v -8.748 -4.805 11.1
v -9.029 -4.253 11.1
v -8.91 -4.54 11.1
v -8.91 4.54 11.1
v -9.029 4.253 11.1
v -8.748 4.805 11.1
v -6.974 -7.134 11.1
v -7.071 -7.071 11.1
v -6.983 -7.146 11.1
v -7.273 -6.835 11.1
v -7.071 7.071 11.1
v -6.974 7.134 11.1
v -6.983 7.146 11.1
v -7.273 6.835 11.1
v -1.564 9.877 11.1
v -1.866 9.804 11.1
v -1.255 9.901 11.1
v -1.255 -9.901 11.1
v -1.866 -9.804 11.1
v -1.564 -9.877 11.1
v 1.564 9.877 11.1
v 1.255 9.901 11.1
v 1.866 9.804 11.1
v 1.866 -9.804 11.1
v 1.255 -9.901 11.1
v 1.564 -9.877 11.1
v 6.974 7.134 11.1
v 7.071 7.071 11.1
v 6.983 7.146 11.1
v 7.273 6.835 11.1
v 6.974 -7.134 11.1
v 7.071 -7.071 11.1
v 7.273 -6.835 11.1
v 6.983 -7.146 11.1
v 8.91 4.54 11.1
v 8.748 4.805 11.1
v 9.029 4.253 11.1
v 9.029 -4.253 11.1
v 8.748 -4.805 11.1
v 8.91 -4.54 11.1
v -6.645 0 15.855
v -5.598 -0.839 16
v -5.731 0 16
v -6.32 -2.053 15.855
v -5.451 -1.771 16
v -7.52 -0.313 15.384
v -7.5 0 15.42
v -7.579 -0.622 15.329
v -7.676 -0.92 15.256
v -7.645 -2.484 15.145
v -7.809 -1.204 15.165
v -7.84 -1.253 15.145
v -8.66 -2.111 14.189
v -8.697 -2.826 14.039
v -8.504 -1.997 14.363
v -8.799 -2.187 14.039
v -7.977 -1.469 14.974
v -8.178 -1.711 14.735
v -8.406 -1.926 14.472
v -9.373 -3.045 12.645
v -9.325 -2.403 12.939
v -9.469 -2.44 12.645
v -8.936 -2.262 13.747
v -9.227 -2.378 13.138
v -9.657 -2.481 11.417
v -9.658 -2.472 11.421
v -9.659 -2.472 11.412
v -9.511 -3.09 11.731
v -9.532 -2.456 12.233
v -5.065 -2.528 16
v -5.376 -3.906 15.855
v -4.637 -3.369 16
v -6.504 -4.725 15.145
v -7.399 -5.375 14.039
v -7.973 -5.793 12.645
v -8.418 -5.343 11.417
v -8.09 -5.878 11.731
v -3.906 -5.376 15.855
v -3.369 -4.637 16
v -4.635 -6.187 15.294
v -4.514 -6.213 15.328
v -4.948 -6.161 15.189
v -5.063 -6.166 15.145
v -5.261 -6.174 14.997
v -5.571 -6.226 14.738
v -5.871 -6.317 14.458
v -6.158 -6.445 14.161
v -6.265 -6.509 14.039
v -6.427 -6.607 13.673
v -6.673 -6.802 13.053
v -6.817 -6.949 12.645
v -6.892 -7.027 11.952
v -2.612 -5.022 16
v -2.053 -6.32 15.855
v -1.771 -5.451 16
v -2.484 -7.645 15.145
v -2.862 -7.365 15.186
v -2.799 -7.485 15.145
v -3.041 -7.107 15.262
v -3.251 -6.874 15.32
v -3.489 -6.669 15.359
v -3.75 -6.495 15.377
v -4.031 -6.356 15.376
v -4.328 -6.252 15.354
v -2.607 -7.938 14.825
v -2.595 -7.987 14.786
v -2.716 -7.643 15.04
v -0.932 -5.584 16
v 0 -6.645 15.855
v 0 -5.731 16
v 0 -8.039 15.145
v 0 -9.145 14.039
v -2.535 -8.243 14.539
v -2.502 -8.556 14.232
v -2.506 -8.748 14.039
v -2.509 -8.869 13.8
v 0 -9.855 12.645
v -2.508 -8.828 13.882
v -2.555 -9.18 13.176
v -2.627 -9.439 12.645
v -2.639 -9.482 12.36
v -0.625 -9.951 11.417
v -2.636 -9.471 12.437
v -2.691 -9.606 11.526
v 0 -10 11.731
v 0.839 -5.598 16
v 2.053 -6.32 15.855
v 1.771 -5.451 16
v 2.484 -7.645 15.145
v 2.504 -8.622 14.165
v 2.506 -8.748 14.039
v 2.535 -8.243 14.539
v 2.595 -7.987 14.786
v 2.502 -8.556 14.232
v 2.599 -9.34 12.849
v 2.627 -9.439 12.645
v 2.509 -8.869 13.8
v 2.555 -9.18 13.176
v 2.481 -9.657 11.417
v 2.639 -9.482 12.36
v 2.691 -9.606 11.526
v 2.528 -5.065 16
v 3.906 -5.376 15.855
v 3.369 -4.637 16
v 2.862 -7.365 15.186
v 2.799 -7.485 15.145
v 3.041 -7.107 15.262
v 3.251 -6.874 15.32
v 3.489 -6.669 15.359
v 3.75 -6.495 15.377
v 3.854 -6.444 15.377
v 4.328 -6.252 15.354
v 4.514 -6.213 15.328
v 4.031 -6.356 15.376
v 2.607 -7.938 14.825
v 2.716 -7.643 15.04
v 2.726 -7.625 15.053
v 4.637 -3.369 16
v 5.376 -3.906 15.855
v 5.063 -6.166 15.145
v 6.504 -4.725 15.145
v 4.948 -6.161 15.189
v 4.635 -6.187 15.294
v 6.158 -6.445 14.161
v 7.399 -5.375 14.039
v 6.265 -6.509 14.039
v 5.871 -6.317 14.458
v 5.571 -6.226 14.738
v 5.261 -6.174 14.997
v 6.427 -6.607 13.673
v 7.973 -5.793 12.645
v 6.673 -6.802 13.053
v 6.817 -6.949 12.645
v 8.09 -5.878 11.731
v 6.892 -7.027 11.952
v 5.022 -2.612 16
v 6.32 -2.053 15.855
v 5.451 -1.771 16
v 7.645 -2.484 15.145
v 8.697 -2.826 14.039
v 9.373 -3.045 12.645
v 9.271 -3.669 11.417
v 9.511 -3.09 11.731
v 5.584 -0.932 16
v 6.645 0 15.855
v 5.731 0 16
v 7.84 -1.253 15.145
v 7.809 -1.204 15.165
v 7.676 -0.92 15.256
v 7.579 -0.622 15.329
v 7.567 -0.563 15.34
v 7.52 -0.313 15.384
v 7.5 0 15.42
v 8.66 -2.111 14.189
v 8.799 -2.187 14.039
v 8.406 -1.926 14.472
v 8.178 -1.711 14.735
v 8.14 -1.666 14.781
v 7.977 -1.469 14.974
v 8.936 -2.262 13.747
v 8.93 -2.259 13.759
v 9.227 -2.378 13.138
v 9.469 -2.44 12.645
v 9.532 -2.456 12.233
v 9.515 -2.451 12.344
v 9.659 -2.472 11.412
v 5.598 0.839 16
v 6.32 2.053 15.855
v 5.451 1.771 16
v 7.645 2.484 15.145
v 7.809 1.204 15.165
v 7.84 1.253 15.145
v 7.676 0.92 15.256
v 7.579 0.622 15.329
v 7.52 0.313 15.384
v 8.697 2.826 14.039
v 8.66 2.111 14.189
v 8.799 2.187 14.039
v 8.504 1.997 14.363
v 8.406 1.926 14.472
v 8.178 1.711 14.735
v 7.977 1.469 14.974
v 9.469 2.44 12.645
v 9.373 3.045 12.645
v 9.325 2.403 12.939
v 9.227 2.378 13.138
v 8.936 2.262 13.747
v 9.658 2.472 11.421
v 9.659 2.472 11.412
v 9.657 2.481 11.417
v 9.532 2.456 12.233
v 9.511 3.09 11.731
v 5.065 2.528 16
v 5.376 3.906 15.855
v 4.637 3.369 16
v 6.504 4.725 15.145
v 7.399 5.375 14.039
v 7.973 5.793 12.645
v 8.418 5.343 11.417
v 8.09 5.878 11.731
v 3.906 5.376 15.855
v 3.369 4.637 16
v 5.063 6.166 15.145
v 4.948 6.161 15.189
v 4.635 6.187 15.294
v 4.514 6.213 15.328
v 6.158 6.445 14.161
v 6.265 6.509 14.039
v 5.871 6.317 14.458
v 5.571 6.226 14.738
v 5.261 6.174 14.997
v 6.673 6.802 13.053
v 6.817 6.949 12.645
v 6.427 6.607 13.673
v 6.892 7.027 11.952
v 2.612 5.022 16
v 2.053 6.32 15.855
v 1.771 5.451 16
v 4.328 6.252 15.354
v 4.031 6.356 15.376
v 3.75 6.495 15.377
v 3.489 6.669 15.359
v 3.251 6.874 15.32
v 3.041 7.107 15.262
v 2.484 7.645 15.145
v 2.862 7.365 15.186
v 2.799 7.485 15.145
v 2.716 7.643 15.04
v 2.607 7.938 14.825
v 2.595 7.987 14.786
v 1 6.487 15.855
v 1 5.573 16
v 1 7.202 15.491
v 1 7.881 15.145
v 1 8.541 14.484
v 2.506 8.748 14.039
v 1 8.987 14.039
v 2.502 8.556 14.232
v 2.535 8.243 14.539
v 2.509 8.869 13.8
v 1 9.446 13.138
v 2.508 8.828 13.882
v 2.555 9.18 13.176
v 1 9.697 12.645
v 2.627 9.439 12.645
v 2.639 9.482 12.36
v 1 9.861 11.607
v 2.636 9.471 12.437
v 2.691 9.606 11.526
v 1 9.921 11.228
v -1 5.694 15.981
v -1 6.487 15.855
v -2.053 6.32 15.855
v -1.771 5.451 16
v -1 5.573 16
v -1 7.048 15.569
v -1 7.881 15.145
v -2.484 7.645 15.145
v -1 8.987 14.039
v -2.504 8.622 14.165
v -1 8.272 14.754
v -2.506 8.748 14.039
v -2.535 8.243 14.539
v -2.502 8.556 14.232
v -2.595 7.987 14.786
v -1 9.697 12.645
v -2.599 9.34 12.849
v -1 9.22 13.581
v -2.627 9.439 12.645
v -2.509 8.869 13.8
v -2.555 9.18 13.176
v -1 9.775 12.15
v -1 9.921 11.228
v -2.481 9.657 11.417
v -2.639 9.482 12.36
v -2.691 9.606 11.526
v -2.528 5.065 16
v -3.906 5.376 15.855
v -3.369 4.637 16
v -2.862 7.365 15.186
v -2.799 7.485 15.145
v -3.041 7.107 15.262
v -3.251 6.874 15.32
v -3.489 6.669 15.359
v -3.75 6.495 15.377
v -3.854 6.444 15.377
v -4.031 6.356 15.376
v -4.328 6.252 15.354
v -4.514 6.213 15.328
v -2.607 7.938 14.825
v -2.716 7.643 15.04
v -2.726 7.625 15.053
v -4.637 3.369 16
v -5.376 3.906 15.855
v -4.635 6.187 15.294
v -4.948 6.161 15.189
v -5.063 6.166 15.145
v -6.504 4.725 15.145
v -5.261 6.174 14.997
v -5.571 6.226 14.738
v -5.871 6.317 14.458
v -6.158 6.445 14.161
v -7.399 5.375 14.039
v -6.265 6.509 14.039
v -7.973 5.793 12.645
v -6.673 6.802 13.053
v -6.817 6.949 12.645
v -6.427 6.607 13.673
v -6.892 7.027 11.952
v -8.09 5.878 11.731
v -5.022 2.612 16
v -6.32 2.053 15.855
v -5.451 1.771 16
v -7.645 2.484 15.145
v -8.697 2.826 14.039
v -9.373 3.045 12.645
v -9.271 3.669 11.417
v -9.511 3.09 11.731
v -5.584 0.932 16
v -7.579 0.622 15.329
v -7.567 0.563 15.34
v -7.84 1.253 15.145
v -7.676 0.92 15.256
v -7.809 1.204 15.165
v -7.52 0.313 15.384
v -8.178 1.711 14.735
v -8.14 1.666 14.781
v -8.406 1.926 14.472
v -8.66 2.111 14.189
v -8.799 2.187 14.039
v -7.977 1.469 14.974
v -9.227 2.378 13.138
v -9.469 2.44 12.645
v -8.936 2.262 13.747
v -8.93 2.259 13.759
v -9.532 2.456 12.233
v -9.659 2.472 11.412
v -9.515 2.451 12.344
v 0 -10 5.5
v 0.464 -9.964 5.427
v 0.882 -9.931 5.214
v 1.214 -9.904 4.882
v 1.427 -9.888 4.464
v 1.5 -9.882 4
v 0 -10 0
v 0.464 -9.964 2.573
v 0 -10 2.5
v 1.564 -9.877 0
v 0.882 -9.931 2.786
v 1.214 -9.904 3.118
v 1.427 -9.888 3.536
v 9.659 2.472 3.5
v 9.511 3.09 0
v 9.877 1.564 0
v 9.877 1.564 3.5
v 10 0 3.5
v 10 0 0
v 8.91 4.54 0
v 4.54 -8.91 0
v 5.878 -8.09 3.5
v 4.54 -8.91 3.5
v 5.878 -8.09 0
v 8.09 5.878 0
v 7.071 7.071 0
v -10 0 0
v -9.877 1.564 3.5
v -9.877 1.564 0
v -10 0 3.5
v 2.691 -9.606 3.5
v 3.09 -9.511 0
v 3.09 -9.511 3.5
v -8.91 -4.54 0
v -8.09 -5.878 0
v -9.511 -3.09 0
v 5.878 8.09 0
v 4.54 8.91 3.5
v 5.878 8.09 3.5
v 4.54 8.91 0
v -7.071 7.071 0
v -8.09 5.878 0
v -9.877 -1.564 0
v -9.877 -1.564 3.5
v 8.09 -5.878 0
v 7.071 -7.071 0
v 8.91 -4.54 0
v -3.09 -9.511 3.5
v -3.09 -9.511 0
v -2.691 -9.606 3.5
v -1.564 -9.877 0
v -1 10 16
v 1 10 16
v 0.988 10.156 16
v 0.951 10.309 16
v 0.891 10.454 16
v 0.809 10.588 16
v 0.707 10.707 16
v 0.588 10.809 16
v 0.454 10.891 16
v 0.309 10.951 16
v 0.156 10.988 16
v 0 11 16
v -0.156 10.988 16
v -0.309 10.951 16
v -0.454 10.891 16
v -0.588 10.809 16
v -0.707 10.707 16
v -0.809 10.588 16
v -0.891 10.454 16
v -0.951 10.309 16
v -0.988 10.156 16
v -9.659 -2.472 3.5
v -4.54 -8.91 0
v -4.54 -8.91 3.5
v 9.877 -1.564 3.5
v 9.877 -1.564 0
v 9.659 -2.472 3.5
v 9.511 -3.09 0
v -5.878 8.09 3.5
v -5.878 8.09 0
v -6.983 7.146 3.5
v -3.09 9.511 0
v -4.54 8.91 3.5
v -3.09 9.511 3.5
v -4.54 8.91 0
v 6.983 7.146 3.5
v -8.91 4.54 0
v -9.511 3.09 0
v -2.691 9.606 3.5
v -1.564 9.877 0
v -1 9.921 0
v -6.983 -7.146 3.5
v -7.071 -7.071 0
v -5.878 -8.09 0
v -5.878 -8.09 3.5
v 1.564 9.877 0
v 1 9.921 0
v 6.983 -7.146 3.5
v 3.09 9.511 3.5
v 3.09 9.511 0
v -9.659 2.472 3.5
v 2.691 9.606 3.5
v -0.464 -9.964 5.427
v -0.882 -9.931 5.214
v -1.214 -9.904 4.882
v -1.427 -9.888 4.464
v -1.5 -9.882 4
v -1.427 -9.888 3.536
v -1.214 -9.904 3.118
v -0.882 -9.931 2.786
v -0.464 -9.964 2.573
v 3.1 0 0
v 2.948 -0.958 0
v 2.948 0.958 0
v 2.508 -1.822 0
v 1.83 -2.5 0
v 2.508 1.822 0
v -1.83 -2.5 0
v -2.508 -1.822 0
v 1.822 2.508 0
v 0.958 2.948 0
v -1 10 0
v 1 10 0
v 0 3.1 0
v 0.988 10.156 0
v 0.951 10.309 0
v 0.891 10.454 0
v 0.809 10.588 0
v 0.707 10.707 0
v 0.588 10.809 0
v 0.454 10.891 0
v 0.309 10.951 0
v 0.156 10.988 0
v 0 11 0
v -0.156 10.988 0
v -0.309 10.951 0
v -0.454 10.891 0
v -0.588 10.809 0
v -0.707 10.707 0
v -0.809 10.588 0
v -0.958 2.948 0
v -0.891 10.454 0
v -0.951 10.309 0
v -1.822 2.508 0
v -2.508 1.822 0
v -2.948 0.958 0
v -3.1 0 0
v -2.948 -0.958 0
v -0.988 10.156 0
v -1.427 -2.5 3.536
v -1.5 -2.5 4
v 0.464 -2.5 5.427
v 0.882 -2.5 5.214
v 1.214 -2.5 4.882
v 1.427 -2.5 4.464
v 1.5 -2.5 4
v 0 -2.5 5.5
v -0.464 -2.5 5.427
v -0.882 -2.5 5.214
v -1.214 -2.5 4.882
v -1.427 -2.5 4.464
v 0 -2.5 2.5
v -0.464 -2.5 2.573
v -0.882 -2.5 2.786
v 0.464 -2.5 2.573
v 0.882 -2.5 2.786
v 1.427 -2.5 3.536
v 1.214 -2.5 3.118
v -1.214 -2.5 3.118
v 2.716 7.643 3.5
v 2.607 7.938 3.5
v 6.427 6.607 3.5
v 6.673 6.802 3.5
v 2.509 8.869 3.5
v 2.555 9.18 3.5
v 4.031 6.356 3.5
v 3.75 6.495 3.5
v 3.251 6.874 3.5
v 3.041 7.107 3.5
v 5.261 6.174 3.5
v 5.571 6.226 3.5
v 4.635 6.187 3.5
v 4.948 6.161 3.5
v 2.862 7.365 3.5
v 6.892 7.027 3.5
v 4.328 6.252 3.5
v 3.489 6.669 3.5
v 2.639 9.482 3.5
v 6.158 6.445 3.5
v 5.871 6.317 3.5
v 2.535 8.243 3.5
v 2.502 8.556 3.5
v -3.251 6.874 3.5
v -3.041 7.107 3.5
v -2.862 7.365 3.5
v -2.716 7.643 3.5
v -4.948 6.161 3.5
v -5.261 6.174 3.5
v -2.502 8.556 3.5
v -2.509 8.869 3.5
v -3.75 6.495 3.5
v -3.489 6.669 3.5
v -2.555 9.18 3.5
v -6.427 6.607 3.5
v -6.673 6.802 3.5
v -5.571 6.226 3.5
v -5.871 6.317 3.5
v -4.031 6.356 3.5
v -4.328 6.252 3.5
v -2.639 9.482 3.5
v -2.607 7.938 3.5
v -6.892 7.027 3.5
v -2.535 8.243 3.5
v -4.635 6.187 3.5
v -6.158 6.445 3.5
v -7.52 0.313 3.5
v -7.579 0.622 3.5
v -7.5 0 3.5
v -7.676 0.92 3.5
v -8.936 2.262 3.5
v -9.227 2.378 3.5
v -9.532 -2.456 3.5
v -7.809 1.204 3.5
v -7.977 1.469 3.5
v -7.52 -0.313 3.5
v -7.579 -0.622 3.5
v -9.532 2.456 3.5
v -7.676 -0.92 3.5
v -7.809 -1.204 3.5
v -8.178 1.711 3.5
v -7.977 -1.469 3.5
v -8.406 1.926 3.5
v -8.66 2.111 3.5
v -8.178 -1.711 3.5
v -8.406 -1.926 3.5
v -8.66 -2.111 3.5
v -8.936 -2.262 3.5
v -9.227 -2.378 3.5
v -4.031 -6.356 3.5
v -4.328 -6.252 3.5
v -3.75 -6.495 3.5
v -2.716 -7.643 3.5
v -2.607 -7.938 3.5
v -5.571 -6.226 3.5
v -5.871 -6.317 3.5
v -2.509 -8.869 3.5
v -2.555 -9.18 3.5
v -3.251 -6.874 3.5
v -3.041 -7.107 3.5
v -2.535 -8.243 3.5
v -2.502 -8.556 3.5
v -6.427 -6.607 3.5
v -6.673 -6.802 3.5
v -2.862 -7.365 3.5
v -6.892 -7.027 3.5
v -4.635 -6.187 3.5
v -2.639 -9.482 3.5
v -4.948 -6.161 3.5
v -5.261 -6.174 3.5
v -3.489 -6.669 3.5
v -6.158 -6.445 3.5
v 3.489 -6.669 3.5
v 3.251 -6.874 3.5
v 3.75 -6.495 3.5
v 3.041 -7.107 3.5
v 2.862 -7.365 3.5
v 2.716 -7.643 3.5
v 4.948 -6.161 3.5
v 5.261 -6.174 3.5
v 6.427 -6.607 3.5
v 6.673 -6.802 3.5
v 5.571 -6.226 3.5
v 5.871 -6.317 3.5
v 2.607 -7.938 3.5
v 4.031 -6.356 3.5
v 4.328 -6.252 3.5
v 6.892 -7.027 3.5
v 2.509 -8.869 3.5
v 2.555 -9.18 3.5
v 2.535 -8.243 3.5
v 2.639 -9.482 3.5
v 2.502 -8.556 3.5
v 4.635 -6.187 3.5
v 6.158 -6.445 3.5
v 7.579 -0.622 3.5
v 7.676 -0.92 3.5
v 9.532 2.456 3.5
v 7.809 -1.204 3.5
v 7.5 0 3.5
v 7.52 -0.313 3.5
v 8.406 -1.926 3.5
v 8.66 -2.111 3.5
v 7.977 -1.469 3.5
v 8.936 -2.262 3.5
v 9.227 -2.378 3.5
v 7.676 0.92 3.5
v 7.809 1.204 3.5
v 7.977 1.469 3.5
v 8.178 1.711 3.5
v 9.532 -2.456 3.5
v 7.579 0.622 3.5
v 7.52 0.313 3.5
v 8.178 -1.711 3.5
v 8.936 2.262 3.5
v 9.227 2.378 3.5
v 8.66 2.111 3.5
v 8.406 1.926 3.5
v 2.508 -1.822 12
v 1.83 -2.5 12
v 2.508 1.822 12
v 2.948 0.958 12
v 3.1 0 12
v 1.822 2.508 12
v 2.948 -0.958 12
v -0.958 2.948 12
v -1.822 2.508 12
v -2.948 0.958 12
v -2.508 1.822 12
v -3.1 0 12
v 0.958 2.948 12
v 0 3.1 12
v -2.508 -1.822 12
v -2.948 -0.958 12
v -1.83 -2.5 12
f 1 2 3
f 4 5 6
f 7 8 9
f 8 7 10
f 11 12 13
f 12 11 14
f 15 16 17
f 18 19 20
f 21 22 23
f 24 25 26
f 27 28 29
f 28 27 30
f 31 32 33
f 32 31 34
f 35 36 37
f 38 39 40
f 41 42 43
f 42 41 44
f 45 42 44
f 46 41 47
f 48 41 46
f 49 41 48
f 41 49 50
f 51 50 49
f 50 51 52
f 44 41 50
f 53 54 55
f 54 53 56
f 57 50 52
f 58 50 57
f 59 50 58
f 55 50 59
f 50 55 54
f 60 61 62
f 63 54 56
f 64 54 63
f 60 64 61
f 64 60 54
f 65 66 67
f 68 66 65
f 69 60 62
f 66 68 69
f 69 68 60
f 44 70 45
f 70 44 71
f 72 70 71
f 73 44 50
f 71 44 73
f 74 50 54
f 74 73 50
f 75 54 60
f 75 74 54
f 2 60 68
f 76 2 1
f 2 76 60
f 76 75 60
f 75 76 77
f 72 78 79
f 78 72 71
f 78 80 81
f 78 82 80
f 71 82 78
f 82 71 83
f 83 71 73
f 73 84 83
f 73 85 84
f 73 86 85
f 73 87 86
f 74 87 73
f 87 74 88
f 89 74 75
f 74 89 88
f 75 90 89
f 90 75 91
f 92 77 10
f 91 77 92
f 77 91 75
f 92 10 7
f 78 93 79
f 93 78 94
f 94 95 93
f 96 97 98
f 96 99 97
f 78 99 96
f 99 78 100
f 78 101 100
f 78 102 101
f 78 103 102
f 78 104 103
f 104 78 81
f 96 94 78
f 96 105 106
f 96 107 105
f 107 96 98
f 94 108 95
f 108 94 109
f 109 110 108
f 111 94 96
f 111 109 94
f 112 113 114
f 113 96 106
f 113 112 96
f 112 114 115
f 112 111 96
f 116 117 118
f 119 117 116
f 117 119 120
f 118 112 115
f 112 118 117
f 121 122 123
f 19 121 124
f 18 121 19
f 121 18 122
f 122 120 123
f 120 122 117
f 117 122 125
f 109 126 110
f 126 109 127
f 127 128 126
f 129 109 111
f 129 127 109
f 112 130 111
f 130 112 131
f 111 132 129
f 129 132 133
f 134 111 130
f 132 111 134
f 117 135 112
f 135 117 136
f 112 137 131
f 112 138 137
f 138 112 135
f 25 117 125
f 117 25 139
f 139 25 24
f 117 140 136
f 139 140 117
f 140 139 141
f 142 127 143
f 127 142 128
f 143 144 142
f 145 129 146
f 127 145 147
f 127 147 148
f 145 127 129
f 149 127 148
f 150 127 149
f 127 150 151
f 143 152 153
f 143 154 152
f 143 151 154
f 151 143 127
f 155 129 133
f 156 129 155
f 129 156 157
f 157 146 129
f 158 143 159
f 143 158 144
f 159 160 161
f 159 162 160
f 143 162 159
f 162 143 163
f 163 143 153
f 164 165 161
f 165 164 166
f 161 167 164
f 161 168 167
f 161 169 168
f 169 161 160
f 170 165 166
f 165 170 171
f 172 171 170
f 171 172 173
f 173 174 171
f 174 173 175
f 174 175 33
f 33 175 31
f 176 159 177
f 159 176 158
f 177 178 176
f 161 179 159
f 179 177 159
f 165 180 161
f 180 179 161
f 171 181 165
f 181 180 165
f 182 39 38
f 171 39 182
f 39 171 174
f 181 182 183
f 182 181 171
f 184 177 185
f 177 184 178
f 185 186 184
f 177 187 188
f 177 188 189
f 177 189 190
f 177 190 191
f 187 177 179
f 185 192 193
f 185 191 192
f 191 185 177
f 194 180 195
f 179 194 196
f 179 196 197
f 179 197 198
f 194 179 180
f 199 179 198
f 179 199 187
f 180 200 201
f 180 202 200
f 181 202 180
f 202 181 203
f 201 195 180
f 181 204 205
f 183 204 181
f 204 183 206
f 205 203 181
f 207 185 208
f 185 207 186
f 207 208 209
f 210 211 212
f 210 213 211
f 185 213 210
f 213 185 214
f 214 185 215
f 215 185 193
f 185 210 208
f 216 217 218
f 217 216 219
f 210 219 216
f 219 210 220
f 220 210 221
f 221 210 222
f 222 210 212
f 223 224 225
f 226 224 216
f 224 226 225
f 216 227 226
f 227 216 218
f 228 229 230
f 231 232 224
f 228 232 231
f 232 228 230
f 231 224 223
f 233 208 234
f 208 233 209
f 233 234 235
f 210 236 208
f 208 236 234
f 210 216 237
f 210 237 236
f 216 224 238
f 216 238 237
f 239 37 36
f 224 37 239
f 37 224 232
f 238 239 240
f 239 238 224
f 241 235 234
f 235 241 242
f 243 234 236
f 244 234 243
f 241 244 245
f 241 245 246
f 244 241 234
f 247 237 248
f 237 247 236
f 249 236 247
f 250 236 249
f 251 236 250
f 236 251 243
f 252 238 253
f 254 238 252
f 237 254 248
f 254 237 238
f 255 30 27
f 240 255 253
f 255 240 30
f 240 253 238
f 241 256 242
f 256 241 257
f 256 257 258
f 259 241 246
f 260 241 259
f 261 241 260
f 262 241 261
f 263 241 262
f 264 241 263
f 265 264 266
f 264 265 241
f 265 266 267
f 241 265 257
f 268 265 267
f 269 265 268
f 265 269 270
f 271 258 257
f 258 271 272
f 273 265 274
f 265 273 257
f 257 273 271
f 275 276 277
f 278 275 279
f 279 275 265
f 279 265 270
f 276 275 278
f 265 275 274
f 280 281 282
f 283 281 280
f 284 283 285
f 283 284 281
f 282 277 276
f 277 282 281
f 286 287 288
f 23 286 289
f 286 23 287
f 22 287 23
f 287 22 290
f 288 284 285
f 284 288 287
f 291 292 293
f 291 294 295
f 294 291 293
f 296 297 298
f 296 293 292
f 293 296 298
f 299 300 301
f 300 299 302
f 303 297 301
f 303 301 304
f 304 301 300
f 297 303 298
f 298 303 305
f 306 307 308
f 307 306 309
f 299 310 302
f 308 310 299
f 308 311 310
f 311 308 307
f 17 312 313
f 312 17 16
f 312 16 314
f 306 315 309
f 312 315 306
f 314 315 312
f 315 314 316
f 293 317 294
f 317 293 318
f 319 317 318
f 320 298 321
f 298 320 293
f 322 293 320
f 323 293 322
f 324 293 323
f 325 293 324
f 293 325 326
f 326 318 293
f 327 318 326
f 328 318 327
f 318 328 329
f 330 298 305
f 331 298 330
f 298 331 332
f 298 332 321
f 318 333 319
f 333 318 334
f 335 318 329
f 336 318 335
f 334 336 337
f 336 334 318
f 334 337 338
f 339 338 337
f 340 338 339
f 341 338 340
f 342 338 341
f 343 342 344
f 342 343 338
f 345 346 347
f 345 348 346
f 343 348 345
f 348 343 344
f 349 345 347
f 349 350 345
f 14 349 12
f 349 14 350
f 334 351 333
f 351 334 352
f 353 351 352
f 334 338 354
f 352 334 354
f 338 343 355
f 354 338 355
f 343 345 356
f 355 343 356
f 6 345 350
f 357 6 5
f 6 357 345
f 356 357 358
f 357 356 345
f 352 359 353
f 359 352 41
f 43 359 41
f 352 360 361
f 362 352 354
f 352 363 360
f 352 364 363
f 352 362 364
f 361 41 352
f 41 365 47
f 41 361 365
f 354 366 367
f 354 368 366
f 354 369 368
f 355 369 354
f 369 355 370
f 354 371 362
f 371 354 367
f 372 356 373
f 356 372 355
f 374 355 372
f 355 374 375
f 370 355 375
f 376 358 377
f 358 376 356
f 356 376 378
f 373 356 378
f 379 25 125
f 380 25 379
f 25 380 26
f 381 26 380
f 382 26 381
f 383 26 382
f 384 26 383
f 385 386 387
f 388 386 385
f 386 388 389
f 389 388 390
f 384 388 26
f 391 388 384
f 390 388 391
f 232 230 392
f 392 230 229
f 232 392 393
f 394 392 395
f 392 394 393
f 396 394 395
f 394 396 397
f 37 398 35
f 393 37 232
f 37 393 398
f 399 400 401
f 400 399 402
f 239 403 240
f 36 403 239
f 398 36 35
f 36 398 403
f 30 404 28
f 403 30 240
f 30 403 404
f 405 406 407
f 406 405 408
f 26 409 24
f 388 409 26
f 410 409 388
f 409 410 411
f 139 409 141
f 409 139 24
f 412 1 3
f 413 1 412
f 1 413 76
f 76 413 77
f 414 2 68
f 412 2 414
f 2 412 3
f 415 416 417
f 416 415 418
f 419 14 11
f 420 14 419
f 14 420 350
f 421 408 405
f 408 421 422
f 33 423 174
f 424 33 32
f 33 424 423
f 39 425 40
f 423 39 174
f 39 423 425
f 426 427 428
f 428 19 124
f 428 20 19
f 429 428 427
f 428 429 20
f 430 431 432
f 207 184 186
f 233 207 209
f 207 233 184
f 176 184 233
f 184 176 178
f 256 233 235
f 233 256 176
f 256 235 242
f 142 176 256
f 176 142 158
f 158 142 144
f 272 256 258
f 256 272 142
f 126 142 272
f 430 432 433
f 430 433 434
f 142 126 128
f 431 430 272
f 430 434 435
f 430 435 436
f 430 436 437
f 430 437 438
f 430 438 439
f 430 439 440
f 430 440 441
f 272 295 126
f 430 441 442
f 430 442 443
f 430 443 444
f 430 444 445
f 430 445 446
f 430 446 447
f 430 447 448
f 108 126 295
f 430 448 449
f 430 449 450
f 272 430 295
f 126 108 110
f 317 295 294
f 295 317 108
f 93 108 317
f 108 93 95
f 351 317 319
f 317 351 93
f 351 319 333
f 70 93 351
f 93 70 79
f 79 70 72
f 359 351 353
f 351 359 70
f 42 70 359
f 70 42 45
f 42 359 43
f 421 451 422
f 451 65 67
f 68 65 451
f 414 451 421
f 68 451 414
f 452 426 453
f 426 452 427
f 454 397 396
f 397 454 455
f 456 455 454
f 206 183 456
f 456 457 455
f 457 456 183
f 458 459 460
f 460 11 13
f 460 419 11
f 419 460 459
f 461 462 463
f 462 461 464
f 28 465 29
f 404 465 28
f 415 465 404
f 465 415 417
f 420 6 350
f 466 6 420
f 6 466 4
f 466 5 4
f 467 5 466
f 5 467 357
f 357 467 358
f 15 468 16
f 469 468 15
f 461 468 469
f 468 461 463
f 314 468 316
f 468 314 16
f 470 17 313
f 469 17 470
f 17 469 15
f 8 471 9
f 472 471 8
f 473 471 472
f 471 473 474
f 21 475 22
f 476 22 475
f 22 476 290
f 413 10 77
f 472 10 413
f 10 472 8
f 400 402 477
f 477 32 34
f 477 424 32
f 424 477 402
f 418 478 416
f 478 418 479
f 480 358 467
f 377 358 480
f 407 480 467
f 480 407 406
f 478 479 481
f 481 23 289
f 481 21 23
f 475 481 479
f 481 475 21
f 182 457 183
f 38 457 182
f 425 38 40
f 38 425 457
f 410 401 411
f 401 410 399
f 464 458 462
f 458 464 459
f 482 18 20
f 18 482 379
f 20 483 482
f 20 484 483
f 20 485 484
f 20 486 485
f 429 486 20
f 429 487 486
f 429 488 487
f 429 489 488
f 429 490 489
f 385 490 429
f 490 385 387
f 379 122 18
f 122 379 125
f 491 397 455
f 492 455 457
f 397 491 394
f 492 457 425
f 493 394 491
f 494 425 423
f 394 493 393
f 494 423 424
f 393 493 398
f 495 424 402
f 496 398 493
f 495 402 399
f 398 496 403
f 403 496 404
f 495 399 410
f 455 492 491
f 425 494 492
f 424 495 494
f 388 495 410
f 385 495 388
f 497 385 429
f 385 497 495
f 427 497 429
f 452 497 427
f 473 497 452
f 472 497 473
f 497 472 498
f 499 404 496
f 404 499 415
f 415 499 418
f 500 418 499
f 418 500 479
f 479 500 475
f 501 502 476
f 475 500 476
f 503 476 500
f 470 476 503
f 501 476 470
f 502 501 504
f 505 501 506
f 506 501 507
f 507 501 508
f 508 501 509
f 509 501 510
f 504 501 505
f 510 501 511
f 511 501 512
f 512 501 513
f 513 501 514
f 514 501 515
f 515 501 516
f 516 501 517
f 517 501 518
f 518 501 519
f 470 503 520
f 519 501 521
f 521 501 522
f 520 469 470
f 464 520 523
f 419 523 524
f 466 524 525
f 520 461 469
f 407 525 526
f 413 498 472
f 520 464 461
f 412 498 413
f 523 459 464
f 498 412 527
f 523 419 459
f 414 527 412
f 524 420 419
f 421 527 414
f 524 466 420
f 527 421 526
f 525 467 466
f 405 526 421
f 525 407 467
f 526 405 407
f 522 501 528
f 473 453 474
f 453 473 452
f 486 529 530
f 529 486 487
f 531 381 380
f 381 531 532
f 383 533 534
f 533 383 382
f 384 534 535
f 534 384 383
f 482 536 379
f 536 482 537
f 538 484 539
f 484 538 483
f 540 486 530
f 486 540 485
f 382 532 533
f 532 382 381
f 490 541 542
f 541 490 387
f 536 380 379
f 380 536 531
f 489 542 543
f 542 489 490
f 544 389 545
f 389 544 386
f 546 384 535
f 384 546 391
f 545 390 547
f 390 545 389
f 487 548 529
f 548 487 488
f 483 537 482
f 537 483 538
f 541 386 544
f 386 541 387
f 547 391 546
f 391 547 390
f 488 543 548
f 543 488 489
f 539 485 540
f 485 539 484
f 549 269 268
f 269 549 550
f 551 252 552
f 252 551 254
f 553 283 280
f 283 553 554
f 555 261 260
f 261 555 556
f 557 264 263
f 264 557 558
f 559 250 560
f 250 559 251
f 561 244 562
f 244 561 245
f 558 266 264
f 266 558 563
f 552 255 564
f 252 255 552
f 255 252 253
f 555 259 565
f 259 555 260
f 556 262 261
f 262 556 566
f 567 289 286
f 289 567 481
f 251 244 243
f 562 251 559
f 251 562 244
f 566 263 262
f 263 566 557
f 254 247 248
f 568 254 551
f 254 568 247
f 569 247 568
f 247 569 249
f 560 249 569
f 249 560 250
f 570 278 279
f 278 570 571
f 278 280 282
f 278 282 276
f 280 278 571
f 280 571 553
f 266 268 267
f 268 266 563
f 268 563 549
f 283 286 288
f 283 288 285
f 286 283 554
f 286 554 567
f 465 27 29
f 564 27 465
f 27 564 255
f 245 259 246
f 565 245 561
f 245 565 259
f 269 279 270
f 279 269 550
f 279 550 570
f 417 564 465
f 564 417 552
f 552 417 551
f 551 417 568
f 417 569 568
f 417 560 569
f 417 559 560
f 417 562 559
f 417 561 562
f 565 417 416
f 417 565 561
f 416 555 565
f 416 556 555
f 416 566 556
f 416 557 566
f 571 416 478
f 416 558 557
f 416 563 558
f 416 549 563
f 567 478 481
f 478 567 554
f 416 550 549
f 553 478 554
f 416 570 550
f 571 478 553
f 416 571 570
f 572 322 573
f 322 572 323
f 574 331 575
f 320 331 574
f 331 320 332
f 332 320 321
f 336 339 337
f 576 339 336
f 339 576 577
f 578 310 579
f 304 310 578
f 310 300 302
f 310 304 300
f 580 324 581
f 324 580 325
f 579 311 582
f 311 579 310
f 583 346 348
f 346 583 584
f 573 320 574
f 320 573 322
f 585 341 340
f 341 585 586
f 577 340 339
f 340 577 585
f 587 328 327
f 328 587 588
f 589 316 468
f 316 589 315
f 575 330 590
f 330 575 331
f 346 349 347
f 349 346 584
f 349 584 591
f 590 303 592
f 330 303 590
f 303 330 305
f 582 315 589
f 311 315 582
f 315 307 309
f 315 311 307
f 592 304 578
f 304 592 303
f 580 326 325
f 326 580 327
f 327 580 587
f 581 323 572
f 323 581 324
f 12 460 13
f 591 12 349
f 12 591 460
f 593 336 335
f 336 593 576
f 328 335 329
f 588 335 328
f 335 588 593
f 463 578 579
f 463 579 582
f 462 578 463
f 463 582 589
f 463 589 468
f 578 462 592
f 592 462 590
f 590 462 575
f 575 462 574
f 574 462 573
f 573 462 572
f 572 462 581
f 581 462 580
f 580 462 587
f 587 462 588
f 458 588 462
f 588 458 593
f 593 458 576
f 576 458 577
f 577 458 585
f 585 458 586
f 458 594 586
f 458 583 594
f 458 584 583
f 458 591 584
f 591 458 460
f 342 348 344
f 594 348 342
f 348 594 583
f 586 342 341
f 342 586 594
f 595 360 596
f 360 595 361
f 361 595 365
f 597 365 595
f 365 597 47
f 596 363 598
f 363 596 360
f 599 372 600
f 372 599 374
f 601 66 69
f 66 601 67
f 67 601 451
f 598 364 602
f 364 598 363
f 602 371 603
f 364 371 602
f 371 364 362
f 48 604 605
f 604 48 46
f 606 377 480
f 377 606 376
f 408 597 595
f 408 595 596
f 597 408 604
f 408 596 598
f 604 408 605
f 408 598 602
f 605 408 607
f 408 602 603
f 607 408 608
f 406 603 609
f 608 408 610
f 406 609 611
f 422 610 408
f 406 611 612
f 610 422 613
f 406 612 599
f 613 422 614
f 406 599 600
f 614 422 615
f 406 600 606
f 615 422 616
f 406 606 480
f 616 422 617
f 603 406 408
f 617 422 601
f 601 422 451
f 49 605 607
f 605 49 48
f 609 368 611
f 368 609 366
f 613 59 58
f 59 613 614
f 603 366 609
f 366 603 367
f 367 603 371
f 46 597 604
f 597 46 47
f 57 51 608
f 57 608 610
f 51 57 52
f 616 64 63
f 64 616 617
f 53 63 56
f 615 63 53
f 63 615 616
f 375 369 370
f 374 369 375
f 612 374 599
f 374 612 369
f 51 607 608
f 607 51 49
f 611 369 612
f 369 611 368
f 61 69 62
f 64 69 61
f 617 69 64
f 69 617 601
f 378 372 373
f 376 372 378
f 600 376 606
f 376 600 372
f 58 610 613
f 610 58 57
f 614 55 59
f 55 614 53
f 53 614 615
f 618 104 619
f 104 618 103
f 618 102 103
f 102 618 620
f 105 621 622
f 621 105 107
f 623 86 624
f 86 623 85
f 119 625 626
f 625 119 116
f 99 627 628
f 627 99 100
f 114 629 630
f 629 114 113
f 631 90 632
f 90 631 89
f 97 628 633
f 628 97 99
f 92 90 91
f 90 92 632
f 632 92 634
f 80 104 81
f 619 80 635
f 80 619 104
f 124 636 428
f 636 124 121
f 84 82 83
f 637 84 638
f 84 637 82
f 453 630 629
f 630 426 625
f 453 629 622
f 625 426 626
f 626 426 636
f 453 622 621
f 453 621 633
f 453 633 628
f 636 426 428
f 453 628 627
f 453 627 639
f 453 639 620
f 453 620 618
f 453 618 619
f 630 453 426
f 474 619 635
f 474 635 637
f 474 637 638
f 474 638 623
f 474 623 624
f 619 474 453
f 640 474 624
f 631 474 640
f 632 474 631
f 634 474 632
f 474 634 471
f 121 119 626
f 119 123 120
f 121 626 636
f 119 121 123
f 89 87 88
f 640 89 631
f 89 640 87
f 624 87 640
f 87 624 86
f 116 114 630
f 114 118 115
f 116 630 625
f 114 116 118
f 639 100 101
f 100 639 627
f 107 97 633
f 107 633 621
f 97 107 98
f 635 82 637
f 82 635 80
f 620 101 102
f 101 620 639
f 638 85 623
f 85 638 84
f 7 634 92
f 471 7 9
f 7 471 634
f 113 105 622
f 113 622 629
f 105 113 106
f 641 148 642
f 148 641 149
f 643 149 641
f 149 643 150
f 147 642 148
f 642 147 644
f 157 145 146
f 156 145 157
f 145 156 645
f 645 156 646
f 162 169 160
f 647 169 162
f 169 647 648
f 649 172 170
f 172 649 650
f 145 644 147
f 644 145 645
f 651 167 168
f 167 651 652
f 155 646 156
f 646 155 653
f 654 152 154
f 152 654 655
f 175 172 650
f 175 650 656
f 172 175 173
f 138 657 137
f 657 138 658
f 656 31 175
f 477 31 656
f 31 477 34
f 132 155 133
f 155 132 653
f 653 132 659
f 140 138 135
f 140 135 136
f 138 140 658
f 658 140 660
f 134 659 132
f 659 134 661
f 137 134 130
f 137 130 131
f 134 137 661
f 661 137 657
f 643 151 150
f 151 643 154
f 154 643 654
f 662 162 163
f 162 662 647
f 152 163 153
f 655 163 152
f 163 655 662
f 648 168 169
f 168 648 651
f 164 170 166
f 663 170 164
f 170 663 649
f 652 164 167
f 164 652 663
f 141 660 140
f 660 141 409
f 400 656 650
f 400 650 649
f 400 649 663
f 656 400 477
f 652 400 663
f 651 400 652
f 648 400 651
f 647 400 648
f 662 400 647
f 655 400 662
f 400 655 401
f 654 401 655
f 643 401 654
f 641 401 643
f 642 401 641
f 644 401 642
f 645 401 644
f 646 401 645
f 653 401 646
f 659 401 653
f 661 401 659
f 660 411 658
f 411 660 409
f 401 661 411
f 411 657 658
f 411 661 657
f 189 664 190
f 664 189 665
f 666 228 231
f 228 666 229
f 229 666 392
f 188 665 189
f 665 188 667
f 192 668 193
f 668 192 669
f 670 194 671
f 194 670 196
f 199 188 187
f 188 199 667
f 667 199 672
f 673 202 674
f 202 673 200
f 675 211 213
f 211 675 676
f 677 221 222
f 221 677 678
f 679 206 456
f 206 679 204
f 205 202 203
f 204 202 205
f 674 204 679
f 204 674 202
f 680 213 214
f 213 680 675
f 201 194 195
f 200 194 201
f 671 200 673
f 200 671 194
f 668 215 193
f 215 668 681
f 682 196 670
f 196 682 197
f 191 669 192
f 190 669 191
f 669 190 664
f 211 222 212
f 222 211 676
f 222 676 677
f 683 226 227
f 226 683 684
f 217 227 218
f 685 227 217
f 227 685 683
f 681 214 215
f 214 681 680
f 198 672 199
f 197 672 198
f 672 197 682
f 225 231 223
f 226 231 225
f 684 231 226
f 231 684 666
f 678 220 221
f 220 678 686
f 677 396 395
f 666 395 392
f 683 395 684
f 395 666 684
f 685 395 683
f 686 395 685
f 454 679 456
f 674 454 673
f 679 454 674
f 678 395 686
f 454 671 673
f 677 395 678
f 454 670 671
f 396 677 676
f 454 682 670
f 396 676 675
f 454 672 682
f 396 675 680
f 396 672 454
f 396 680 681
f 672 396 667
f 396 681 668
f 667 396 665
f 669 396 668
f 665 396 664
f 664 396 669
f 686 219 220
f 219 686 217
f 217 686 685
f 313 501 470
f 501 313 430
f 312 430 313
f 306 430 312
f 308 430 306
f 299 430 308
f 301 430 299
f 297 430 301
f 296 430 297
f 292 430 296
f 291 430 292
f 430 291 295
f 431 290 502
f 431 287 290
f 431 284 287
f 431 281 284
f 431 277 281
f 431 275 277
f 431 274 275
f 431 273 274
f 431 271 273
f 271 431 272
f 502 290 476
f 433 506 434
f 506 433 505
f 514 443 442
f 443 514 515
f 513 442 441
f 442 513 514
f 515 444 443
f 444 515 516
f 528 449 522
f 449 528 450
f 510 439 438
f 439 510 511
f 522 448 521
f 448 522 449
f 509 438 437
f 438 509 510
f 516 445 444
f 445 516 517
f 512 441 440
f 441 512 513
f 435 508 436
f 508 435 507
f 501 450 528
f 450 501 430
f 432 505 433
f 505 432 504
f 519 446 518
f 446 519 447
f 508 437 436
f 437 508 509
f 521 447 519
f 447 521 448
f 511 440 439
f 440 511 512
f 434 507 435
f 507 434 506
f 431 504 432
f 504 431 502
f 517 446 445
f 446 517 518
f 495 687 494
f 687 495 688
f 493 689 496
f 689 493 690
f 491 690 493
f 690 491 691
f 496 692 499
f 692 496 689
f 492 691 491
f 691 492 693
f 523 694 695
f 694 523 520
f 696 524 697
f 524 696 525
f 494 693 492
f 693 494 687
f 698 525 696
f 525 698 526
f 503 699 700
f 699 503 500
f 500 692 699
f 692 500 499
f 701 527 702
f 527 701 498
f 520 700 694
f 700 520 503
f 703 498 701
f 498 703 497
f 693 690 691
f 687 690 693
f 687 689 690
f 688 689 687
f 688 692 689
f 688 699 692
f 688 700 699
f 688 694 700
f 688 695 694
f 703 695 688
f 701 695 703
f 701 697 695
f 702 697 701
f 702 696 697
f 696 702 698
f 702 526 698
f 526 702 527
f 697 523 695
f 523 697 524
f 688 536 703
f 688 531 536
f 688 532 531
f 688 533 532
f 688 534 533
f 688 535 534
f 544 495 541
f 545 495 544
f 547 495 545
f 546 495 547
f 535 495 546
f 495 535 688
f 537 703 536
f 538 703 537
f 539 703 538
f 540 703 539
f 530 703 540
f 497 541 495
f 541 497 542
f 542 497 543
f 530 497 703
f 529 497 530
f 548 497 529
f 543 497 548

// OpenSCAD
// [FL_INDEX: keywords="openscad, 3d_parametric, Customizer_Potentiometer_Knobs, csg_solid" | COT="Parametric OpenSCAD design from 3DCodeverse"]
// Title: Customizer Potentiometer Knobs

/*

Parametric Potentiometer Knob Generator
version 1.4
2013 Steve Cooley
http://sc-fa.com
http://beatseqr.com
http://hapticsynapses.com

parametric potentiometer knob generator by steve cooley is licensed under a Creative Commons Attribution-NonCommercial-ShareAlike 3.0 Unported License. Based on a work at sc-fa.com. Permissions beyond the scope of this license may be available at http://sc-fa.com/blog/contact.

view terms of the license here:
http://creativecommons.org/licenses/by-nc-sa/3.0/


version history
---------------
1.4 2013-07-16 added an additive OR subtractive pill shaped indicator type
1.3 2013-04-01 updated for more awesome Thingiverse Customizer
1.2 2013-01-09 updated for Thingiverse Customizer
1.1 2012-04-12 fixed the arrow indicator code to be more robust and easier to adjust parameters for.
1.0 2012-03-?? initial release.


*/

/* [Physical attributes] */

// All values are in Millimeters!  How big the top of the knob is:
01_knob_diameter_top = 20; //[10:100]
knob_radius_top = 01_knob_diameter_top / 2;

// How big the bottom of the knob is:
02_knob_diameter_bottom = 20; // [10:100]
knob_radius_bottom = 02_knob_diameter_bottom / 2;

// how tall the knob is:
03_knob_height = 16; // [5:50]
knob_height = 03_knob_height / 1;

// how smooth or geometric the knob is:
04_knob_smoothness = 40; // [3:40]
knob_smoothness = 04_knob_smoothness / 1;

// (measure the potentiometer shaft with calipers and remember to add a bit for shrinkage.)
05_shaft_diameter = 6.2; // this could be a slider if precision were available
shaft_radius = 05_shaft_diameter / 2;

// how much of the shaft the knob should allow space inside for:
06_shaft_height = 13; // [1:40]
shaft_height = 06_shaft_height / 1;

// higher is smoother
07_shaft_smoothness = 20; // [3:20]
shaft_smoothness = 07_shaft_smoothness / 1;

// some potentiometers have a flat surface on the shaft to allow for the use of a set screw.
08_shaft_hole_is_flatted = "true"; // [true,false]

// ignore if no flat is needed.
09_shaft_hole_flat_size = 5.0; // this could be a slider if precision were available
flat_size = 09_shaft_hole_flat_size / 1;

/* [Set screw] */

// some potentiometers need to have their knobs affixed with a set screw.
10_set_screw = "true"; //[true,false]

// in MM:
11_set_screw_diameter = 3; // [0:8]
set_screw_radius = 11_set_screw_diameter / 2;

// how deep into the knob, from the side:
12_set_screw_depth = 9; // [0:20]
set_screw_depth = 12_set_screw_depth / 1;

// from the top:
13_set_screw_height = 4; // [0:20]
set_screw_height = 13_set_screw_height / 1;

// higher is smoother:
14_quality_of_set_screw = 20; // [0:20]
quality_of_set_screw = 14_quality_of_set_screw / 1;

/* [Decorations] */

// thanks to http://www.iheartrobotics.com/ for the articles!
15_top_edge_smoothing = "true"; // [true,false]

// how big of a smoothing radius to apply
16_top_edge_smoothing_radius = 5.0; // [1:10]
smoothing_radius = 16_top_edge_smoothing_radius / 1;

// Number of facets for the rounding cylinder
17_top_edge_smoothing_smoothness = 20.0; // [1:40]
smooth = 17_top_edge_smoothing_smoothness / 1;

ct = -0.1 / 1; 							// circle translate? not sure.
circle_radius = knob_radius_top / 1;  	// just match the top edge radius
circle_height = 1 / 1; 					// actually.. I don't know what this does.
pad = 0.2 / 1;							// Padding to maintain manifold



/* [External indicator] */

// this is a corner edge of a cube sticking out of the cylinder at the bottom, you can use it instead of the arrow shaped cutout in the top if you like. Or both.
18_pointy_external_indicator = "false"; // [true,false]


// how tall should the indicator be, from the bottom:
19_pointy_external_indicator_height = 3; // [1:50]
pointy_external_indicator_height = 19_pointy_external_indicator_height / 1;

// how far out the indicator should poke out:
20_pointy_external_indicator_pokey_outey_ness = 1.0;
pointy_external_indicator_pokey_outey_ness = 20_pointy_external_indicator_pokey_outey_ness * 1;

pokey_outey_value = pointy_external_indicator_pokey_outey_ness - 1 - pad;
pokey_outey = [pokey_outey_value, pokey_outey_value,0];

// there's an arrow shaped hole you can have. There aren't a lot of controls for this.
// please feel free to improve on this script here.

/* [Pill-shaped indicator] */

// there's an arrow shape you can have in the top of the knob.
00_pill_indicator = "true"; // [true,false]

// add or subtract the pill shape?
00_pill_add_or_subtract = "add"; // [add,subtract]

// relative scale of the pill shape:
00_pill_scale = 1.0;

// height of the pill shape:
00_pill_height = 16.0;

// relative scale of length of the pill shape:
00_pill_length = 2.5;

// where to put the arrow, x:
00_pill_location_x = 0.0;

// where to put the arrow, y:
00_pill_location_y = 5.0;

// where to put the arrow, z:
00_pill_location_z = 0.0;

pill_translate = [00_pill_location_x,00_pill_location_y,00_pill_location_z];


/* [Internal Arrow indicator] */

// there's an arrow shape you can have in the top of the knob.
21_top_of_knob_arrow_indicator = "false"; // [true,false]

// scale the arrow head:
22_arrow_head_scale = 2.0;
arrow_scale_head = 22_arrow_head_scale / 1;

// scale the arrow shaft:
23_arrow_shaft_scale = 1.5;
arrow_scale_shaft = 23_arrow_shaft_scale / 1;

// how big the overall arrow indicator should be:
24_arrow_indicator_scale = 1.3;
arrow_indicator_scale = 24_arrow_indicator_scale / 1;

// where to put the arrow, x:
25_arrow_location_x = 0.0;

// where to put the arrow, y:
26_arrow_location_y = 1.0;

// where to put the arrow, z:
27_arrow_location_z = 16.0;

arrow_indicator_translate = [25_arrow_location_x,26_arrow_location_y,27_arrow_location_z];



/* [Sphere Indentations] */

// for spherical indentations, set the quantity, quality, size, and adjust the placement
28_indentations_sphere = "false"; // [true,false]

29_sphere_number_of_indentations = 12; // [1:50]
sphere_number_of_indentations = 29_sphere_number_of_indentations / 1;

30_sphere_quality_of_indentations = 40; // [1:100]
sphere_quality_of_indentations = 30_sphere_quality_of_indentations / 1;

31_size_of_sphere_indentations = 4; // [1:20]
size_of_sphere_indentations = 31_size_of_sphere_indentations / 1;

// the first number in this set moves the spheres in or out. smaller is closer to the middle
32_sphere_indentation_location_x = 12.0;

// the second number in this set moves the spheres left or right
33_sphere_indentation_location_y = 00.0;

// the third number in this set moves the speheres up or down
34_sphere_indentation_location_z = 15.0;

translation_of_sphere_indentations = [32_sphere_indentation_location_x,33_sphere_indentation_location_y,34_sphere_indentation_location_z];

// in case you are using an odd number of indentations, you way want to adjust the starting angle so that they align to the front or set screw locations.
35_sphere_indentation_starting_rotation = 30; // [-90:90]
sphere_starting_rotation = 35_sphere_indentation_starting_rotation / 1 + 90;

/* [Cylinder Indentations] */

// for cylinder indentations, set quantity, quality, radius, height, and placement
36_indentations_cylinder = "true"; // [true,false]

37_number_of_cylinder_indentations = 6; // [1:40]
cylinder_number_of_indentations = 37_number_of_cylinder_indentations / 1;

// higher is smoother:
38_smoothness_of_cylinder_indentations = 50; // [3:100]
cylinder_quality_of_indentations = 38_smoothness_of_cylinder_indentations / 1;

39_diameter_of_top_of_the_cylinder = 5.0; // [1:20]
radius_of_cylinder_indentations_top = 39_diameter_of_top_of_the_cylinder / 2;

40_diameter_of_bottom_of_the_cylinder = 5.0;  // [1:20]
radius_of_cylinder_indentations_bottom = 40_diameter_of_bottom_of_the_cylinder / 2;

41_height_of_cylinder_indentations = 15.0; // [0:40]
height_of_cylinder_indentations = 41_height_of_cylinder_indentations / 1;

// this moves the cylinders in or out from the center
42_position_of_cylinder_x = -0.0; //[-20:20]

// this moves the cylinders left or right
43_position_of_cylinder_y = 0.0; //[-20:20]

// this moves the cylinders up or down
44_position_of_cylinder_z = -5.0; //[-20:20]

translation_of_cylinder_indentations = [42_position_of_cylinder_x,43_position_of_cylinder_y,44_position_of_cylinder_z];

45_cylinder_starting_rotation = -30; // [-90:90]
cylinder_starting_rotation = 45_cylinder_starting_rotation / 1 - 90;


// these are some setup variables... you probably won't need to mess with them.
negative_knob_radius = knob_radius_bottom*-1;


// this is the main module. It calls the submodules.
make_the_knob();

module make_the_knob()
{
difference()
{
	union()
	{
	difference()
		{
		difference()
			{
		
			difference() 
				{
				difference() 
					{
					
					union()
						{
						
						difference()
							{
							// main cylinder
							cylinder(r1=knob_radius_bottom,r2=knob_radius_top,h=knob_height, $fn=knob_smoothness);
							
							smoothing();				
		
							}
				
						external_direction_indicator();	
						}
					
					}
					
				set_screw_hole();
				}
			
			if(00_pill_add_or_subtract == "subtract")
				{
				pill();
				}
			arrow_indicator();
			indentations();
			}
		
	}
	if(00_pill_add_or_subtract == "add")
							{
							pill();
							}
	
	}
shaft_hole();
}

}
module smoothing() {

// smoothing the top
				if(15_top_edge_smoothing == "true")
					{		
						translate([0,0,knob_height])
						rotate([180,0,0])
						difference() {
							rotate_extrude(convexity=10,  $fn = smooth)
							translate([circle_radius-ct-smoothing_radius+pad,ct-pad,0])
							square(smoothing_radius+pad,smoothing_radius+pad);
	
							rotate_extrude(convexity=10,  $fn = smooth)
							translate([circle_radius-ct-smoothing_radius,ct+smoothing_radius,0])
							circle(r=smoothing_radius,$fn=smooth);
							}	
					}
}

module external_direction_indicator() {

				if(18_pointy_external_indicator == "true")
						{
						
						
						// outer pointy indicator
						rotate([0,0,45])
						translate(pokey_outey)
						// cube size of 8 minimum to point out
						cube(size=[knob_radius_bottom,knob_radius_bottom,pointy_external_indicator_height],center=false);
						}

}

module shaft_hole() {
				// shaft hole
				difference()
					{
					
					// round shaft hole
					translate([ 0, 0, -1 ]) 
					cylinder(r=shaft_radius,h=shaft_height, $fn=shaft_smoothness);
					
					if(08_shaft_hole_is_flatted  == "true")
						{
						// D shaft shape for shaft cutout
						rotate( [0,0,90]) 
						translate([-7.5,-5,0]) 
						cube(size=[flat_size,10,13],center=false);
						}
					}
}


module set_screw_hole() {

			if(10_set_screw == "true")
				{
				// set screw hole
				rotate ([90,0,0])
				translate([ 0, set_screw_height, 1 ])
				cylinder(r=set_screw_radius,h=set_screw_depth, $fn=quality_of_set_screw);
				}
}

module arrow_indicator() {
		if(21_top_of_knob_arrow_indicator == "true")
			{
			translate(arrow_indicator_translate)
			// begin arrow top cutout
			// translate([(knob_radius/2),knob_height,knob_height])
			rotate([90,0,45])
			scale([arrow_indicator_scale*.3,arrow_indicator_scale*.3,arrow_indicator_scale*.3])
			union()
				{			  
				rotate([90,45,0])
				scale([arrow_scale_head,arrow_scale_head,1])
				cylinder(r=8, h=10, $fn=3, center=true);
				rotate([90,45,0])
				translate([-10,0,0])
				scale([arrow_scale_shaft,arrow_scale_shaft,1])
				cube(size=[15,10,10],center=true);
				}
			}
}

module indentations() {

if(28_indentations_sphere == "true")
			{
			for (z = [0:sphere_number_of_indentations]) 
				{
				rotate([0,0,sphere_starting_rotation+((360/sphere_number_of_indentations)*z)])
				translate(translation_of_sphere_indentations)
				sphere(size_of_sphere_indentations, $fn=sphere_quality_of_indentations); 
				}
			}
if(36_indentations_cylinder == "true")
			{
			for (z = [0:cylinder_number_of_indentations]) 
				{
				rotate([0,0,cylinder_starting_rotation+((360/cylinder_number_of_indentations)*z)])
				
				translate([negative_knob_radius,0,knob_height])
				translate(translation_of_cylinder_indentations)
				cylinder(r1=radius_of_cylinder_indentations_bottom, r2=radius_of_cylinder_indentations_top, h=height_of_cylinder_indentations, center=true, $fn=cylinder_quality_of_indentations); 
				}
			}
		}

module pill()
{

if(00_pill_indicator == "true")
	{

	translate(pill_translate)

	rotate([0,0,90])
		{
		union()
			{
			cylinder(00_pill_height,00_pill_scale,00_pill_scale, $fn=40);
			translate([0,-00_pill_scale,0])
				{
					cube([(00_pill_scale*2)*00_pill_length,00_pill_scale*2,00_pill_height]);
				}
			translate([(00_pill_scale*2)*00_pill_length,0,0])
				{
					cylinder(00_pill_height,00_pill_scale,00_pill_scale, $fn=40);
				}
			}
		}
	}
}
